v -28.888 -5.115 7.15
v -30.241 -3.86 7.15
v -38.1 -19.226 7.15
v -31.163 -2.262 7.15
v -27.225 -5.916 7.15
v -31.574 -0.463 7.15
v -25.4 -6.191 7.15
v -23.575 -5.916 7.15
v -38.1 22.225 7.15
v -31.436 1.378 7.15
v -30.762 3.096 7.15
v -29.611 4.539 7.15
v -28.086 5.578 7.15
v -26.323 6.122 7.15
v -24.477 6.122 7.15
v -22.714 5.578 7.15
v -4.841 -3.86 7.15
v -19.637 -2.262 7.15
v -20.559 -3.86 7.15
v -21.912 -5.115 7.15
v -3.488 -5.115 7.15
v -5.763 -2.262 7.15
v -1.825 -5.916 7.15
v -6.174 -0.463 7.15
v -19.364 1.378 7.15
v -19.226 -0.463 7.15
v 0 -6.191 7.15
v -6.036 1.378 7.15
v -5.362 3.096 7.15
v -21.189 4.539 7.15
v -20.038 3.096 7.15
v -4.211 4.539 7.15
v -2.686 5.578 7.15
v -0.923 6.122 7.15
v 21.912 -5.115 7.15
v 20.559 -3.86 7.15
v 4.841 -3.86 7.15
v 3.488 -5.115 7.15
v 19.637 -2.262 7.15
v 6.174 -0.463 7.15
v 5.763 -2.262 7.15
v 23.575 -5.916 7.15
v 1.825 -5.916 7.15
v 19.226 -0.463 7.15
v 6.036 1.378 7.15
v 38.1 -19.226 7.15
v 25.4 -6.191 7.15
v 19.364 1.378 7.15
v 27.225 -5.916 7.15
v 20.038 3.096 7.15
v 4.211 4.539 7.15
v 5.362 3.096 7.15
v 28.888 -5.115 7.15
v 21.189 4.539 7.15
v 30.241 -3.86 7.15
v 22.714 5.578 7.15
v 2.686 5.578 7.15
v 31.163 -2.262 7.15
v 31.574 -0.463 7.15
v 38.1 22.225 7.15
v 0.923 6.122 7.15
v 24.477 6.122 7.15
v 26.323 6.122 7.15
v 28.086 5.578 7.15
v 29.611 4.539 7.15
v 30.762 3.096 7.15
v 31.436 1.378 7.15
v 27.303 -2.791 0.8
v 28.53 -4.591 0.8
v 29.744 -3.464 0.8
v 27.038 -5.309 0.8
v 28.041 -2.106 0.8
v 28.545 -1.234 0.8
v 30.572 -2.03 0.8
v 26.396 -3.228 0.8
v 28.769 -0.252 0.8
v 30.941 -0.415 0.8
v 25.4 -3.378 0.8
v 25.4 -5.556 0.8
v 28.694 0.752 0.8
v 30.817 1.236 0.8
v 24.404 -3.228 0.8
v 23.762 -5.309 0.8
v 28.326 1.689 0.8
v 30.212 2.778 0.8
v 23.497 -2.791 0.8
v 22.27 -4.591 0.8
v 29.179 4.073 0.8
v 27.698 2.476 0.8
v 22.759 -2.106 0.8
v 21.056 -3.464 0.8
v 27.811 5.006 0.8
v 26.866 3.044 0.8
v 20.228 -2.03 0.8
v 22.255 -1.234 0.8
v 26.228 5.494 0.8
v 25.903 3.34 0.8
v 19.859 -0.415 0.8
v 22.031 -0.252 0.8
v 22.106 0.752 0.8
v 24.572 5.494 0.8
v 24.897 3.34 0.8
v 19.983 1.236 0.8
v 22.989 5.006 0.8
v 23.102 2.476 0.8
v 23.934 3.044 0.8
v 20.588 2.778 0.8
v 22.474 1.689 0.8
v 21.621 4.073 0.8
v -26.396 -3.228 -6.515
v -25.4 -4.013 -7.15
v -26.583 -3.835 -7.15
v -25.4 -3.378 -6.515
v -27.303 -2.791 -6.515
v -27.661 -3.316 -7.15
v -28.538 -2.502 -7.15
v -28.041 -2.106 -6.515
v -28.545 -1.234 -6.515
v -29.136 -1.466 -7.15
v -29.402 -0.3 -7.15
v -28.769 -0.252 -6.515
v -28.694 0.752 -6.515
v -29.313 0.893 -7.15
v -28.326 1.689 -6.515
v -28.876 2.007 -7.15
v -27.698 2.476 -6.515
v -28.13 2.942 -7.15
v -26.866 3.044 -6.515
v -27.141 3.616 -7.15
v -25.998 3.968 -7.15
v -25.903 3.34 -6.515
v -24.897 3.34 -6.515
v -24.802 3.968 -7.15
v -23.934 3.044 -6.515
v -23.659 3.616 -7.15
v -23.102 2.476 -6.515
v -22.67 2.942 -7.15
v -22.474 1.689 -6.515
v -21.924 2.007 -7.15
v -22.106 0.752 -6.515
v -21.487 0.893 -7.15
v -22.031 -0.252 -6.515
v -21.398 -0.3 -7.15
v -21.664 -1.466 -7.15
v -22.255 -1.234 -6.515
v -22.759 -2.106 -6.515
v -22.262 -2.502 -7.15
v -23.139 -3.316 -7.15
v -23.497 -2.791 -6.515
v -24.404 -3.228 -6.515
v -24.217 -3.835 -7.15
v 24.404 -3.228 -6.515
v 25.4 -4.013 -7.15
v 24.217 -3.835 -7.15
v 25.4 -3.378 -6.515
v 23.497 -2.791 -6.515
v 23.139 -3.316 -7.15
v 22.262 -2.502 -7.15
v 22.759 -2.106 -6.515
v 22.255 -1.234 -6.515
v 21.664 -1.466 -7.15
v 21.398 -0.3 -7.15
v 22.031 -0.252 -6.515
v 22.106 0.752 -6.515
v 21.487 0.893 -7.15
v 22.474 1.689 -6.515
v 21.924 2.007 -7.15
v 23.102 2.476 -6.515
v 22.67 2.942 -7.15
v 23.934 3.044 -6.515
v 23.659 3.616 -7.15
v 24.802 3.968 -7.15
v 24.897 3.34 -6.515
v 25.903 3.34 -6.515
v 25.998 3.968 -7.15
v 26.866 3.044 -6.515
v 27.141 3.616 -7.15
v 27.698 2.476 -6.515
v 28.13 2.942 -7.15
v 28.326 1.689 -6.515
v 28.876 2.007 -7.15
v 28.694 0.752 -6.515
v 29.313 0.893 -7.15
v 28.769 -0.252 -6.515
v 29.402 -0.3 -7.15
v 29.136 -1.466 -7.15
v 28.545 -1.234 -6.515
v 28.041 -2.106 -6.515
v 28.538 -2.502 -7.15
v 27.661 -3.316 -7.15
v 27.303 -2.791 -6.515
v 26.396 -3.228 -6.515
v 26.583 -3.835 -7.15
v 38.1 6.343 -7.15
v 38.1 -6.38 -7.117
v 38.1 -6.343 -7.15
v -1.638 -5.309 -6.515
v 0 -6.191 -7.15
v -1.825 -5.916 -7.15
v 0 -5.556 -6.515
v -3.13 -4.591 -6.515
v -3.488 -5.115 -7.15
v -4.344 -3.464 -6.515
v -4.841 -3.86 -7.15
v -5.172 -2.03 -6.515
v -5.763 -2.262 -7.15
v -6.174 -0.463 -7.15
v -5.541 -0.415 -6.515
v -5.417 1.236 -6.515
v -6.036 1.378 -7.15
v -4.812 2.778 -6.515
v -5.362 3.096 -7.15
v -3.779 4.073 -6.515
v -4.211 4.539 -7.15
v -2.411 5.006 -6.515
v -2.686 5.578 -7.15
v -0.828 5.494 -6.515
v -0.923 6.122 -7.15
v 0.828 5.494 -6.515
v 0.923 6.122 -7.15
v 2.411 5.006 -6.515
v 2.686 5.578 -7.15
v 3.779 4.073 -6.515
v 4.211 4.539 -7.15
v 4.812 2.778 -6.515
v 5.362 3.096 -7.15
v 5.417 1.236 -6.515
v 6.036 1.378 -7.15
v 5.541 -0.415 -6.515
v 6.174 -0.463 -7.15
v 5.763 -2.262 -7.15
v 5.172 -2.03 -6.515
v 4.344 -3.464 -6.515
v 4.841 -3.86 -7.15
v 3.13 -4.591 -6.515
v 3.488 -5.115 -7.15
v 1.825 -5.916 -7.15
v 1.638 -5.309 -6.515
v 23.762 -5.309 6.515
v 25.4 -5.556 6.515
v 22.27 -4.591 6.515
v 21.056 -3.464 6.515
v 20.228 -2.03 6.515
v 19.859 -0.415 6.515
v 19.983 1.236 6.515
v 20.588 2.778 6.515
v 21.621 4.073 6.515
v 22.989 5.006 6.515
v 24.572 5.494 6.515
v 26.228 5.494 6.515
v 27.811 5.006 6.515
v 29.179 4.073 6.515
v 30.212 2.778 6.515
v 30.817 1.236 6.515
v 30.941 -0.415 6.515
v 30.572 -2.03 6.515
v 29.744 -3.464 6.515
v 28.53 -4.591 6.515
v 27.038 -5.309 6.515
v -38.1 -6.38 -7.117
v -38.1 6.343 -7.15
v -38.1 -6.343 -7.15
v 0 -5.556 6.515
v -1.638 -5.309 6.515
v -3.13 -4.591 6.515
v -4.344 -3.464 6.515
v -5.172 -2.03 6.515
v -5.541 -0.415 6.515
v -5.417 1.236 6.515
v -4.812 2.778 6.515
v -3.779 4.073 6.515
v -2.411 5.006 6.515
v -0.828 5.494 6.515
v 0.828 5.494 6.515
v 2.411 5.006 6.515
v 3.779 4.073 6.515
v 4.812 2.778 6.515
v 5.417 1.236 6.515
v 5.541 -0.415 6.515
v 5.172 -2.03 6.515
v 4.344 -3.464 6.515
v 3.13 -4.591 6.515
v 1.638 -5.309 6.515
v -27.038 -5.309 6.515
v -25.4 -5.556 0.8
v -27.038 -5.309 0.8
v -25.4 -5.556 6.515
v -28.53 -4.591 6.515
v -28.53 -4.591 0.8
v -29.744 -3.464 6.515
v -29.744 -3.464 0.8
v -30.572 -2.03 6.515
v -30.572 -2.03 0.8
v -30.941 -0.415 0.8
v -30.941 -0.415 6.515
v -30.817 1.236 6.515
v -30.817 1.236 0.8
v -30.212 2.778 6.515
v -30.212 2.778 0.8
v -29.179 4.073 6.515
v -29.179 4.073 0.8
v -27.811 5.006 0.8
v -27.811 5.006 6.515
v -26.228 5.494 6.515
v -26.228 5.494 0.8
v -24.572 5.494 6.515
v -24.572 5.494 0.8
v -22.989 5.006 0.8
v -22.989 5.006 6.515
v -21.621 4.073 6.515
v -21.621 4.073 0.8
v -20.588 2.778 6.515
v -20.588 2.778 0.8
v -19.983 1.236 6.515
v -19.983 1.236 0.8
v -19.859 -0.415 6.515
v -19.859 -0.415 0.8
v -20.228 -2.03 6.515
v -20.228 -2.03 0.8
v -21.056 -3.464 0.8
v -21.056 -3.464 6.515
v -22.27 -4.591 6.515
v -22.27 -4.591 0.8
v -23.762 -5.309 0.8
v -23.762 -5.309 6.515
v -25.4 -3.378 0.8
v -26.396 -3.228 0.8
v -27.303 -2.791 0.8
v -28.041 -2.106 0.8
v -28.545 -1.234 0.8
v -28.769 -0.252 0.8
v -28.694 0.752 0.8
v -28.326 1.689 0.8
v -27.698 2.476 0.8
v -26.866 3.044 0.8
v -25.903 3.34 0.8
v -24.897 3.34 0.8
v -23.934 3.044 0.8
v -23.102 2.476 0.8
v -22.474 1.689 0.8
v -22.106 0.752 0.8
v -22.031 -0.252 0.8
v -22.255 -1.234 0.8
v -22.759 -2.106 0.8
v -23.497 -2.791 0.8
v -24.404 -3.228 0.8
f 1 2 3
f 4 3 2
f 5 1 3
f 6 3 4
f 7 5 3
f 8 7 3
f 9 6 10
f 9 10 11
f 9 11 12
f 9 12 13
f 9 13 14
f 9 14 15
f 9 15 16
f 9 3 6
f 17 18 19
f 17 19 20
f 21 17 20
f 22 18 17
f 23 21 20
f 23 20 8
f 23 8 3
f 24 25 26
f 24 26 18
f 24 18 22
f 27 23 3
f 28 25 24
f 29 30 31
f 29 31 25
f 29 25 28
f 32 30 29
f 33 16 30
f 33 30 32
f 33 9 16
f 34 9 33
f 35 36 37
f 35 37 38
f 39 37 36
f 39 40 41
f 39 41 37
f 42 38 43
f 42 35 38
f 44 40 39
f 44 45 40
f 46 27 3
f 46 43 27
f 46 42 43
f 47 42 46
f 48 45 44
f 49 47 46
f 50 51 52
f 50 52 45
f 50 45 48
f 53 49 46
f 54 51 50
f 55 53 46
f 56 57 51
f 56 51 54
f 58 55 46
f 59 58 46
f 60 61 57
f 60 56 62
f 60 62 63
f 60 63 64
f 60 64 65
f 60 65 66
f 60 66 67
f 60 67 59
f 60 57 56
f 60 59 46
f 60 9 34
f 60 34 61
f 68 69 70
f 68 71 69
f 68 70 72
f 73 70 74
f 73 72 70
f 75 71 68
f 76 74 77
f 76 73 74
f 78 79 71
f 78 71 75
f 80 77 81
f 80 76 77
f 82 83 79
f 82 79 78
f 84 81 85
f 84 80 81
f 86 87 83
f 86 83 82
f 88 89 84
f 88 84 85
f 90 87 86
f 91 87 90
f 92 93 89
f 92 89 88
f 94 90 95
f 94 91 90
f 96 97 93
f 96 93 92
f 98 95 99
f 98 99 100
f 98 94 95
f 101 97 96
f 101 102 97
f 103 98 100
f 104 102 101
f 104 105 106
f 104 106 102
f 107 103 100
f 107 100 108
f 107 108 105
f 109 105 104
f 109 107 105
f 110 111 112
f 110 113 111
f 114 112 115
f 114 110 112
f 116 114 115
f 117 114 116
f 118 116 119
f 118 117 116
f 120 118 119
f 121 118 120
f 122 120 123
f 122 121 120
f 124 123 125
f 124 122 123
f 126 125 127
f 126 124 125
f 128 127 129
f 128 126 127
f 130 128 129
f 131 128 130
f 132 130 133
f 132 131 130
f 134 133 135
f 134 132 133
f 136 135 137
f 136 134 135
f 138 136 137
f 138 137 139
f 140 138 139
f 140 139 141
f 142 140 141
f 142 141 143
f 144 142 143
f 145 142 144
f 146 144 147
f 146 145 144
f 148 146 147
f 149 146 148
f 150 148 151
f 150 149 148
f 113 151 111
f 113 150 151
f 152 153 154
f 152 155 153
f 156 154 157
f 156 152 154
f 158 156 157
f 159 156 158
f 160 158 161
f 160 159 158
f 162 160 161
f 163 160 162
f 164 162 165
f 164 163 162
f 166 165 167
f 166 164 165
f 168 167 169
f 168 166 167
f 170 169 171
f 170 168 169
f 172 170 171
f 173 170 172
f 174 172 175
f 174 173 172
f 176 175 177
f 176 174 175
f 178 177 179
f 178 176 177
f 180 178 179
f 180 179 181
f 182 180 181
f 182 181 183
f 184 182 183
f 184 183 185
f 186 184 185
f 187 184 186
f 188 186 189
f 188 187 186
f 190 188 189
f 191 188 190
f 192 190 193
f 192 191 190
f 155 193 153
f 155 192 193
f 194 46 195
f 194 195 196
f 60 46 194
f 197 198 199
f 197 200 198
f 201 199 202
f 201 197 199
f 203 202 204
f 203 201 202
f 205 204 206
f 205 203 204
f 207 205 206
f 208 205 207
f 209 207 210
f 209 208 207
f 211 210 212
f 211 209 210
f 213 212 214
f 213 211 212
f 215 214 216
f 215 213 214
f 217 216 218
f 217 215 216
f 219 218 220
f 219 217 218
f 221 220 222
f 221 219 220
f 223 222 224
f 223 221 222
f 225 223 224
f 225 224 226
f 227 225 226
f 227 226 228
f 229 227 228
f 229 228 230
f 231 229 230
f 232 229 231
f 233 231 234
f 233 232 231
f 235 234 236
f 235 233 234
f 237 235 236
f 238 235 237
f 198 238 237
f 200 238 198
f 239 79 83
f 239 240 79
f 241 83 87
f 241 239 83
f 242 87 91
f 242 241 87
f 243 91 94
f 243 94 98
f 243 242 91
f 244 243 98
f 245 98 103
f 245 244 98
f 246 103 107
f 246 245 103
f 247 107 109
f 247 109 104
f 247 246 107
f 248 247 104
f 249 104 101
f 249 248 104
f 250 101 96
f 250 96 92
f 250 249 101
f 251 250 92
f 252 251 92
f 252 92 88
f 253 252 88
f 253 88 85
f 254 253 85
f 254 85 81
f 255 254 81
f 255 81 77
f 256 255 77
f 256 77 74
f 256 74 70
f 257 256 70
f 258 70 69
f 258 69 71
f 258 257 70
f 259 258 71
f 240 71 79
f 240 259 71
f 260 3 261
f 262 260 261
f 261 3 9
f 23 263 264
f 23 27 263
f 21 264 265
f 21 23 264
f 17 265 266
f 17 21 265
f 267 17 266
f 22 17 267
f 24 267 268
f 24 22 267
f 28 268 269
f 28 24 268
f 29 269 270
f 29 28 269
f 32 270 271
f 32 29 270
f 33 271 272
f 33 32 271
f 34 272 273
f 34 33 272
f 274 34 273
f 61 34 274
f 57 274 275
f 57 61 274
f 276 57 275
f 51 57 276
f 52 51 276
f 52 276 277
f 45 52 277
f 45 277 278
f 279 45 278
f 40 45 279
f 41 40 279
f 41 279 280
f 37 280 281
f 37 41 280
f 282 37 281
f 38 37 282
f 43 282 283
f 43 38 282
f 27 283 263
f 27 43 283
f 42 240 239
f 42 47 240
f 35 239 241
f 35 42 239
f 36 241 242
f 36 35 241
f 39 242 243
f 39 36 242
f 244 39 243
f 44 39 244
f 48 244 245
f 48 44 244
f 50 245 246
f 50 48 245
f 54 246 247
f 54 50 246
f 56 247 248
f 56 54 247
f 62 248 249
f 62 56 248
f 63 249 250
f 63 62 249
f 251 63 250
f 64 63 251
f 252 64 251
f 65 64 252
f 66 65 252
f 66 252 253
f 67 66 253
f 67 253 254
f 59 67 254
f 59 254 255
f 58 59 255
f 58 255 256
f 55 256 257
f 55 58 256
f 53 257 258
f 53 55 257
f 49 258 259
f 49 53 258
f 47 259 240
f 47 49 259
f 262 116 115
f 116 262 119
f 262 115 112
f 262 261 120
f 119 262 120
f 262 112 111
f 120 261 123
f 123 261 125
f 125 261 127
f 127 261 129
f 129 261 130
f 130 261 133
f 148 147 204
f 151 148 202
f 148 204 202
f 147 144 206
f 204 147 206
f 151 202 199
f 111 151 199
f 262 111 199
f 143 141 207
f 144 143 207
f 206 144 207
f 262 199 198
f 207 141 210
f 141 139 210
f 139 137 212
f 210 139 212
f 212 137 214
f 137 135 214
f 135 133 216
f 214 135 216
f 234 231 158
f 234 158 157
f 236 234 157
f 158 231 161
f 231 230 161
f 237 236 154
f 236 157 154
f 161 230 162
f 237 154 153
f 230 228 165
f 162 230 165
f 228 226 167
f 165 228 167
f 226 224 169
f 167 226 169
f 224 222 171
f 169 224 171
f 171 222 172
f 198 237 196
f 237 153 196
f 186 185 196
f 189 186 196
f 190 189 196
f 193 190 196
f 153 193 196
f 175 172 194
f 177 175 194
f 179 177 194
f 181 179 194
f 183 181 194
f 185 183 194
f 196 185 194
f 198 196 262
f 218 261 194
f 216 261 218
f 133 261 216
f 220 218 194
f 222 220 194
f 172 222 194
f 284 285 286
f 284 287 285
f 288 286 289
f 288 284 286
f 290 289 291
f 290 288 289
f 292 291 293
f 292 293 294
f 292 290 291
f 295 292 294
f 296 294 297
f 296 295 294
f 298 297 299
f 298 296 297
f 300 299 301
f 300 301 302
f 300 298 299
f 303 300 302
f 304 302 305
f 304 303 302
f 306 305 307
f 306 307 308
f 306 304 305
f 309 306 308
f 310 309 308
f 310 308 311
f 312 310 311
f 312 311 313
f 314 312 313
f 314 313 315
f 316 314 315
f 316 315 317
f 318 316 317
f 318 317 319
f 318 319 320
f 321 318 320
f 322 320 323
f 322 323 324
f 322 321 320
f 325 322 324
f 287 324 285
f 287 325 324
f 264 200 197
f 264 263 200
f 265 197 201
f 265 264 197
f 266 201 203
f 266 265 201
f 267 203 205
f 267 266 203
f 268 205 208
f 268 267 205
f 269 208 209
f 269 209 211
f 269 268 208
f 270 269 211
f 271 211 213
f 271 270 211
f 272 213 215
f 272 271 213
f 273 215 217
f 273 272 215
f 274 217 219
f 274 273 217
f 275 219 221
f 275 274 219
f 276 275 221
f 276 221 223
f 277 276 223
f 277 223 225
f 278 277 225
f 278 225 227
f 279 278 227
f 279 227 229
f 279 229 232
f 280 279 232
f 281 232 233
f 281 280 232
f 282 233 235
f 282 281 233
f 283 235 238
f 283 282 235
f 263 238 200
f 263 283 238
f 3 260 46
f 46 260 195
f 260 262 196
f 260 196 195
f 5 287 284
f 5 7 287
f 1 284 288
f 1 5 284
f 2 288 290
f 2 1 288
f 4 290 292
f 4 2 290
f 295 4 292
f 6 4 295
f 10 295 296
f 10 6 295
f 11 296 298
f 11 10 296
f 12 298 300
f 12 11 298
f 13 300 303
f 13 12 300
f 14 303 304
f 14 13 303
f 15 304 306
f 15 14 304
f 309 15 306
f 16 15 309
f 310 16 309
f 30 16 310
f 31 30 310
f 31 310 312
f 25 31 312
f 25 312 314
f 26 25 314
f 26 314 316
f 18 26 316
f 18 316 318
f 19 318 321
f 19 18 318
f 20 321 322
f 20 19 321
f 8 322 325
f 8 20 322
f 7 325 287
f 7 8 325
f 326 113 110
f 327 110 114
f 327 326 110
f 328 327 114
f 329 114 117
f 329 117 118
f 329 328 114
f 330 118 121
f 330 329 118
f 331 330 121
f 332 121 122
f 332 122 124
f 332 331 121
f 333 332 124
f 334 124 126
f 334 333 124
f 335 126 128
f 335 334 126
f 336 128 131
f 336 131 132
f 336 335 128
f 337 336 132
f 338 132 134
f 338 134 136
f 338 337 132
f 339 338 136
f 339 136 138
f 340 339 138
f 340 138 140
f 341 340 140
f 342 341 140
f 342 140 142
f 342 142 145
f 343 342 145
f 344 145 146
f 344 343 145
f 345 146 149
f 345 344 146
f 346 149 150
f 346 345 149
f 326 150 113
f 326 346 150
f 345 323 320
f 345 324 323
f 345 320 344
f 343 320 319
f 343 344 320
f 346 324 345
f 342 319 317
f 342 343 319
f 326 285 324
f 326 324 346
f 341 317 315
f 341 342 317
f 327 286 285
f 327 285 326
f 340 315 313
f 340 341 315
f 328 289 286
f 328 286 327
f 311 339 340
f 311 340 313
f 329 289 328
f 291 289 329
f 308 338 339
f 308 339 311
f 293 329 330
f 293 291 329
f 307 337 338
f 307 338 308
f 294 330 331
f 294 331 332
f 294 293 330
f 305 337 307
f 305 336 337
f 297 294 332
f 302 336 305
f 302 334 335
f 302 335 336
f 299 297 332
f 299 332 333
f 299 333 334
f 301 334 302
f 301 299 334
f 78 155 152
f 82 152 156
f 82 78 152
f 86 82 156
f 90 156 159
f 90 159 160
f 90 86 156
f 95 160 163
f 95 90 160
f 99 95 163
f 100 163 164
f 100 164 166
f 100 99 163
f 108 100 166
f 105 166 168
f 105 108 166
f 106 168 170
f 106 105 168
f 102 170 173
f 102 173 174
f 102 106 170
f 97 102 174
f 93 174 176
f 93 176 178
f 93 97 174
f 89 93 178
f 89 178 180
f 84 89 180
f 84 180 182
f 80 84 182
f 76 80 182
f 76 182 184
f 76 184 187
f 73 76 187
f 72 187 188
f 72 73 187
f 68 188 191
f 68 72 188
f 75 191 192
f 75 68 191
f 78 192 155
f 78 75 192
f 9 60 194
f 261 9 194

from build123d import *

# Parameters (mm, degrees)
SKETCH1_W                                     = 76.2
SKETCH1_H                                     = 44.45
BOSS_EXTRUDE1_DEPTH                           = 7.1501
CUT_EXTRUDE1_DEPTH                            = 80.696389849
CBORE_FOR_1_4_SOCKET_HEAD_CAP_SCREW1_AT_COUNT = 2
CBORE_FOR_1_4_SOCKET_HEAD_CAP_SCREW1_AT_PITCH = 50.8
CAVITY1_START                                 = -11.732042998
CAVITY1_OUTLINE_W                             = 78.1
CAVITY1_OUTLINE_H                             = 25
CAVITY1_DEPTH                                 = 2.228722608


# Read off the part's stored shape, not the designer's step: Cavity1
with BuildPart() as part:
    # Sketch1 → Boss-Extrude1 (new, symmetric)
    with BuildSketch(Plane.XY):
        Rectangle(SKETCH1_W, SKETCH1_H)
    extrude(amount=BOSS_EXTRUDE1_DEPTH, both=True)

    # Sketch2 → Cut-Extrude1 (cut, through all)
    with BuildSketch(Plane(origin=(38.1, 0, 0), x_dir=(0, 0, -1), z_dir=(1, 0, 0))):
        Polygon((7.1501, -6.343018915), (-7.1501, -22.225), (7.1501, -22.225), align=None)
        Polygon((-7.1501, 22.225), (7.1501, 6.343018915), (7.1501, 22.225), align=None)
    extrude(amount=-CUT_EXTRUDE1_DEPTH, mode=Mode.SUBTRACT)

    # Sketch6 → CBORE for 1/4 Socket Head Cap Screw1 (revolve, cut)
    with BuildSketch(Plane(origin=(-25.4, 0, 7.1501), x_dir=(0, -1, 0), z_dir=(1, 0, 0))):
        Polygon((0, 0), (0, 14.3002), (4.0132, 14.3002), (3.3782, 13.6652), (3.3782, 6.35), (5.55625, 6.35), (5.55625, 0.635), (6.19125, 0), align=None)
    cbore_for_1_4_socket_head_cap_screw1 = revolve(axis=Axis((-25.4, 0, 13.5001), (0, 0, -1)), mode=Mode.SUBTRACT)

    # CBORE for 1/4 Socket Head Cap Screw1 at: CBORE for 1/4 Socket Head Cap Screw1 ×2
    with Locations(*[(i * CBORE_FOR_1_4_SOCKET_HEAD_CAP_SCREW1_AT_PITCH, 0, 0) for i in range(1, CBORE_FOR_1_4_SOCKET_HEAD_CAP_SCREW1_AT_COUNT)]):
        add(cbore_for_1_4_socket_head_cap_screw1, mode=Mode.SUBTRACT)

    # Sketch8 → 7/16 (0.4375) Diameter Hole1 (revolve, cut)
    with BuildSketch(Plane(origin=(0, 0, 7.1501), x_dir=(0, -1, 0), z_dir=(1, 0, 0))):
        Polygon((0, 0), (0, 14.3002), (6.19125, 14.3002), (5.55625, 13.6652), (5.55625, 0.635), (6.19125, 0), align=None)
    revolve(axis=Axis((0, 0, 13.5001), (0, 0, -1)), mode=Mode.SUBTRACT)

    # Cavity1 outline → Cavity1 (cut)
    with BuildSketch(Plane(origin=(0, 0, 0), x_dir=(1, 0, 0), z_dir=(0, 0.7431448254773938, 0.6691306063588588)).offset(CAVITY1_START)):
        with Locations((-0.95, -9.5)):
            Rectangle(CAVITY1_OUTLINE_W, CAVITY1_OUTLINE_H)
    extrude(amount=CAVITY1_DEPTH, mode=Mode.SUBTRACT)


solid = part.part
